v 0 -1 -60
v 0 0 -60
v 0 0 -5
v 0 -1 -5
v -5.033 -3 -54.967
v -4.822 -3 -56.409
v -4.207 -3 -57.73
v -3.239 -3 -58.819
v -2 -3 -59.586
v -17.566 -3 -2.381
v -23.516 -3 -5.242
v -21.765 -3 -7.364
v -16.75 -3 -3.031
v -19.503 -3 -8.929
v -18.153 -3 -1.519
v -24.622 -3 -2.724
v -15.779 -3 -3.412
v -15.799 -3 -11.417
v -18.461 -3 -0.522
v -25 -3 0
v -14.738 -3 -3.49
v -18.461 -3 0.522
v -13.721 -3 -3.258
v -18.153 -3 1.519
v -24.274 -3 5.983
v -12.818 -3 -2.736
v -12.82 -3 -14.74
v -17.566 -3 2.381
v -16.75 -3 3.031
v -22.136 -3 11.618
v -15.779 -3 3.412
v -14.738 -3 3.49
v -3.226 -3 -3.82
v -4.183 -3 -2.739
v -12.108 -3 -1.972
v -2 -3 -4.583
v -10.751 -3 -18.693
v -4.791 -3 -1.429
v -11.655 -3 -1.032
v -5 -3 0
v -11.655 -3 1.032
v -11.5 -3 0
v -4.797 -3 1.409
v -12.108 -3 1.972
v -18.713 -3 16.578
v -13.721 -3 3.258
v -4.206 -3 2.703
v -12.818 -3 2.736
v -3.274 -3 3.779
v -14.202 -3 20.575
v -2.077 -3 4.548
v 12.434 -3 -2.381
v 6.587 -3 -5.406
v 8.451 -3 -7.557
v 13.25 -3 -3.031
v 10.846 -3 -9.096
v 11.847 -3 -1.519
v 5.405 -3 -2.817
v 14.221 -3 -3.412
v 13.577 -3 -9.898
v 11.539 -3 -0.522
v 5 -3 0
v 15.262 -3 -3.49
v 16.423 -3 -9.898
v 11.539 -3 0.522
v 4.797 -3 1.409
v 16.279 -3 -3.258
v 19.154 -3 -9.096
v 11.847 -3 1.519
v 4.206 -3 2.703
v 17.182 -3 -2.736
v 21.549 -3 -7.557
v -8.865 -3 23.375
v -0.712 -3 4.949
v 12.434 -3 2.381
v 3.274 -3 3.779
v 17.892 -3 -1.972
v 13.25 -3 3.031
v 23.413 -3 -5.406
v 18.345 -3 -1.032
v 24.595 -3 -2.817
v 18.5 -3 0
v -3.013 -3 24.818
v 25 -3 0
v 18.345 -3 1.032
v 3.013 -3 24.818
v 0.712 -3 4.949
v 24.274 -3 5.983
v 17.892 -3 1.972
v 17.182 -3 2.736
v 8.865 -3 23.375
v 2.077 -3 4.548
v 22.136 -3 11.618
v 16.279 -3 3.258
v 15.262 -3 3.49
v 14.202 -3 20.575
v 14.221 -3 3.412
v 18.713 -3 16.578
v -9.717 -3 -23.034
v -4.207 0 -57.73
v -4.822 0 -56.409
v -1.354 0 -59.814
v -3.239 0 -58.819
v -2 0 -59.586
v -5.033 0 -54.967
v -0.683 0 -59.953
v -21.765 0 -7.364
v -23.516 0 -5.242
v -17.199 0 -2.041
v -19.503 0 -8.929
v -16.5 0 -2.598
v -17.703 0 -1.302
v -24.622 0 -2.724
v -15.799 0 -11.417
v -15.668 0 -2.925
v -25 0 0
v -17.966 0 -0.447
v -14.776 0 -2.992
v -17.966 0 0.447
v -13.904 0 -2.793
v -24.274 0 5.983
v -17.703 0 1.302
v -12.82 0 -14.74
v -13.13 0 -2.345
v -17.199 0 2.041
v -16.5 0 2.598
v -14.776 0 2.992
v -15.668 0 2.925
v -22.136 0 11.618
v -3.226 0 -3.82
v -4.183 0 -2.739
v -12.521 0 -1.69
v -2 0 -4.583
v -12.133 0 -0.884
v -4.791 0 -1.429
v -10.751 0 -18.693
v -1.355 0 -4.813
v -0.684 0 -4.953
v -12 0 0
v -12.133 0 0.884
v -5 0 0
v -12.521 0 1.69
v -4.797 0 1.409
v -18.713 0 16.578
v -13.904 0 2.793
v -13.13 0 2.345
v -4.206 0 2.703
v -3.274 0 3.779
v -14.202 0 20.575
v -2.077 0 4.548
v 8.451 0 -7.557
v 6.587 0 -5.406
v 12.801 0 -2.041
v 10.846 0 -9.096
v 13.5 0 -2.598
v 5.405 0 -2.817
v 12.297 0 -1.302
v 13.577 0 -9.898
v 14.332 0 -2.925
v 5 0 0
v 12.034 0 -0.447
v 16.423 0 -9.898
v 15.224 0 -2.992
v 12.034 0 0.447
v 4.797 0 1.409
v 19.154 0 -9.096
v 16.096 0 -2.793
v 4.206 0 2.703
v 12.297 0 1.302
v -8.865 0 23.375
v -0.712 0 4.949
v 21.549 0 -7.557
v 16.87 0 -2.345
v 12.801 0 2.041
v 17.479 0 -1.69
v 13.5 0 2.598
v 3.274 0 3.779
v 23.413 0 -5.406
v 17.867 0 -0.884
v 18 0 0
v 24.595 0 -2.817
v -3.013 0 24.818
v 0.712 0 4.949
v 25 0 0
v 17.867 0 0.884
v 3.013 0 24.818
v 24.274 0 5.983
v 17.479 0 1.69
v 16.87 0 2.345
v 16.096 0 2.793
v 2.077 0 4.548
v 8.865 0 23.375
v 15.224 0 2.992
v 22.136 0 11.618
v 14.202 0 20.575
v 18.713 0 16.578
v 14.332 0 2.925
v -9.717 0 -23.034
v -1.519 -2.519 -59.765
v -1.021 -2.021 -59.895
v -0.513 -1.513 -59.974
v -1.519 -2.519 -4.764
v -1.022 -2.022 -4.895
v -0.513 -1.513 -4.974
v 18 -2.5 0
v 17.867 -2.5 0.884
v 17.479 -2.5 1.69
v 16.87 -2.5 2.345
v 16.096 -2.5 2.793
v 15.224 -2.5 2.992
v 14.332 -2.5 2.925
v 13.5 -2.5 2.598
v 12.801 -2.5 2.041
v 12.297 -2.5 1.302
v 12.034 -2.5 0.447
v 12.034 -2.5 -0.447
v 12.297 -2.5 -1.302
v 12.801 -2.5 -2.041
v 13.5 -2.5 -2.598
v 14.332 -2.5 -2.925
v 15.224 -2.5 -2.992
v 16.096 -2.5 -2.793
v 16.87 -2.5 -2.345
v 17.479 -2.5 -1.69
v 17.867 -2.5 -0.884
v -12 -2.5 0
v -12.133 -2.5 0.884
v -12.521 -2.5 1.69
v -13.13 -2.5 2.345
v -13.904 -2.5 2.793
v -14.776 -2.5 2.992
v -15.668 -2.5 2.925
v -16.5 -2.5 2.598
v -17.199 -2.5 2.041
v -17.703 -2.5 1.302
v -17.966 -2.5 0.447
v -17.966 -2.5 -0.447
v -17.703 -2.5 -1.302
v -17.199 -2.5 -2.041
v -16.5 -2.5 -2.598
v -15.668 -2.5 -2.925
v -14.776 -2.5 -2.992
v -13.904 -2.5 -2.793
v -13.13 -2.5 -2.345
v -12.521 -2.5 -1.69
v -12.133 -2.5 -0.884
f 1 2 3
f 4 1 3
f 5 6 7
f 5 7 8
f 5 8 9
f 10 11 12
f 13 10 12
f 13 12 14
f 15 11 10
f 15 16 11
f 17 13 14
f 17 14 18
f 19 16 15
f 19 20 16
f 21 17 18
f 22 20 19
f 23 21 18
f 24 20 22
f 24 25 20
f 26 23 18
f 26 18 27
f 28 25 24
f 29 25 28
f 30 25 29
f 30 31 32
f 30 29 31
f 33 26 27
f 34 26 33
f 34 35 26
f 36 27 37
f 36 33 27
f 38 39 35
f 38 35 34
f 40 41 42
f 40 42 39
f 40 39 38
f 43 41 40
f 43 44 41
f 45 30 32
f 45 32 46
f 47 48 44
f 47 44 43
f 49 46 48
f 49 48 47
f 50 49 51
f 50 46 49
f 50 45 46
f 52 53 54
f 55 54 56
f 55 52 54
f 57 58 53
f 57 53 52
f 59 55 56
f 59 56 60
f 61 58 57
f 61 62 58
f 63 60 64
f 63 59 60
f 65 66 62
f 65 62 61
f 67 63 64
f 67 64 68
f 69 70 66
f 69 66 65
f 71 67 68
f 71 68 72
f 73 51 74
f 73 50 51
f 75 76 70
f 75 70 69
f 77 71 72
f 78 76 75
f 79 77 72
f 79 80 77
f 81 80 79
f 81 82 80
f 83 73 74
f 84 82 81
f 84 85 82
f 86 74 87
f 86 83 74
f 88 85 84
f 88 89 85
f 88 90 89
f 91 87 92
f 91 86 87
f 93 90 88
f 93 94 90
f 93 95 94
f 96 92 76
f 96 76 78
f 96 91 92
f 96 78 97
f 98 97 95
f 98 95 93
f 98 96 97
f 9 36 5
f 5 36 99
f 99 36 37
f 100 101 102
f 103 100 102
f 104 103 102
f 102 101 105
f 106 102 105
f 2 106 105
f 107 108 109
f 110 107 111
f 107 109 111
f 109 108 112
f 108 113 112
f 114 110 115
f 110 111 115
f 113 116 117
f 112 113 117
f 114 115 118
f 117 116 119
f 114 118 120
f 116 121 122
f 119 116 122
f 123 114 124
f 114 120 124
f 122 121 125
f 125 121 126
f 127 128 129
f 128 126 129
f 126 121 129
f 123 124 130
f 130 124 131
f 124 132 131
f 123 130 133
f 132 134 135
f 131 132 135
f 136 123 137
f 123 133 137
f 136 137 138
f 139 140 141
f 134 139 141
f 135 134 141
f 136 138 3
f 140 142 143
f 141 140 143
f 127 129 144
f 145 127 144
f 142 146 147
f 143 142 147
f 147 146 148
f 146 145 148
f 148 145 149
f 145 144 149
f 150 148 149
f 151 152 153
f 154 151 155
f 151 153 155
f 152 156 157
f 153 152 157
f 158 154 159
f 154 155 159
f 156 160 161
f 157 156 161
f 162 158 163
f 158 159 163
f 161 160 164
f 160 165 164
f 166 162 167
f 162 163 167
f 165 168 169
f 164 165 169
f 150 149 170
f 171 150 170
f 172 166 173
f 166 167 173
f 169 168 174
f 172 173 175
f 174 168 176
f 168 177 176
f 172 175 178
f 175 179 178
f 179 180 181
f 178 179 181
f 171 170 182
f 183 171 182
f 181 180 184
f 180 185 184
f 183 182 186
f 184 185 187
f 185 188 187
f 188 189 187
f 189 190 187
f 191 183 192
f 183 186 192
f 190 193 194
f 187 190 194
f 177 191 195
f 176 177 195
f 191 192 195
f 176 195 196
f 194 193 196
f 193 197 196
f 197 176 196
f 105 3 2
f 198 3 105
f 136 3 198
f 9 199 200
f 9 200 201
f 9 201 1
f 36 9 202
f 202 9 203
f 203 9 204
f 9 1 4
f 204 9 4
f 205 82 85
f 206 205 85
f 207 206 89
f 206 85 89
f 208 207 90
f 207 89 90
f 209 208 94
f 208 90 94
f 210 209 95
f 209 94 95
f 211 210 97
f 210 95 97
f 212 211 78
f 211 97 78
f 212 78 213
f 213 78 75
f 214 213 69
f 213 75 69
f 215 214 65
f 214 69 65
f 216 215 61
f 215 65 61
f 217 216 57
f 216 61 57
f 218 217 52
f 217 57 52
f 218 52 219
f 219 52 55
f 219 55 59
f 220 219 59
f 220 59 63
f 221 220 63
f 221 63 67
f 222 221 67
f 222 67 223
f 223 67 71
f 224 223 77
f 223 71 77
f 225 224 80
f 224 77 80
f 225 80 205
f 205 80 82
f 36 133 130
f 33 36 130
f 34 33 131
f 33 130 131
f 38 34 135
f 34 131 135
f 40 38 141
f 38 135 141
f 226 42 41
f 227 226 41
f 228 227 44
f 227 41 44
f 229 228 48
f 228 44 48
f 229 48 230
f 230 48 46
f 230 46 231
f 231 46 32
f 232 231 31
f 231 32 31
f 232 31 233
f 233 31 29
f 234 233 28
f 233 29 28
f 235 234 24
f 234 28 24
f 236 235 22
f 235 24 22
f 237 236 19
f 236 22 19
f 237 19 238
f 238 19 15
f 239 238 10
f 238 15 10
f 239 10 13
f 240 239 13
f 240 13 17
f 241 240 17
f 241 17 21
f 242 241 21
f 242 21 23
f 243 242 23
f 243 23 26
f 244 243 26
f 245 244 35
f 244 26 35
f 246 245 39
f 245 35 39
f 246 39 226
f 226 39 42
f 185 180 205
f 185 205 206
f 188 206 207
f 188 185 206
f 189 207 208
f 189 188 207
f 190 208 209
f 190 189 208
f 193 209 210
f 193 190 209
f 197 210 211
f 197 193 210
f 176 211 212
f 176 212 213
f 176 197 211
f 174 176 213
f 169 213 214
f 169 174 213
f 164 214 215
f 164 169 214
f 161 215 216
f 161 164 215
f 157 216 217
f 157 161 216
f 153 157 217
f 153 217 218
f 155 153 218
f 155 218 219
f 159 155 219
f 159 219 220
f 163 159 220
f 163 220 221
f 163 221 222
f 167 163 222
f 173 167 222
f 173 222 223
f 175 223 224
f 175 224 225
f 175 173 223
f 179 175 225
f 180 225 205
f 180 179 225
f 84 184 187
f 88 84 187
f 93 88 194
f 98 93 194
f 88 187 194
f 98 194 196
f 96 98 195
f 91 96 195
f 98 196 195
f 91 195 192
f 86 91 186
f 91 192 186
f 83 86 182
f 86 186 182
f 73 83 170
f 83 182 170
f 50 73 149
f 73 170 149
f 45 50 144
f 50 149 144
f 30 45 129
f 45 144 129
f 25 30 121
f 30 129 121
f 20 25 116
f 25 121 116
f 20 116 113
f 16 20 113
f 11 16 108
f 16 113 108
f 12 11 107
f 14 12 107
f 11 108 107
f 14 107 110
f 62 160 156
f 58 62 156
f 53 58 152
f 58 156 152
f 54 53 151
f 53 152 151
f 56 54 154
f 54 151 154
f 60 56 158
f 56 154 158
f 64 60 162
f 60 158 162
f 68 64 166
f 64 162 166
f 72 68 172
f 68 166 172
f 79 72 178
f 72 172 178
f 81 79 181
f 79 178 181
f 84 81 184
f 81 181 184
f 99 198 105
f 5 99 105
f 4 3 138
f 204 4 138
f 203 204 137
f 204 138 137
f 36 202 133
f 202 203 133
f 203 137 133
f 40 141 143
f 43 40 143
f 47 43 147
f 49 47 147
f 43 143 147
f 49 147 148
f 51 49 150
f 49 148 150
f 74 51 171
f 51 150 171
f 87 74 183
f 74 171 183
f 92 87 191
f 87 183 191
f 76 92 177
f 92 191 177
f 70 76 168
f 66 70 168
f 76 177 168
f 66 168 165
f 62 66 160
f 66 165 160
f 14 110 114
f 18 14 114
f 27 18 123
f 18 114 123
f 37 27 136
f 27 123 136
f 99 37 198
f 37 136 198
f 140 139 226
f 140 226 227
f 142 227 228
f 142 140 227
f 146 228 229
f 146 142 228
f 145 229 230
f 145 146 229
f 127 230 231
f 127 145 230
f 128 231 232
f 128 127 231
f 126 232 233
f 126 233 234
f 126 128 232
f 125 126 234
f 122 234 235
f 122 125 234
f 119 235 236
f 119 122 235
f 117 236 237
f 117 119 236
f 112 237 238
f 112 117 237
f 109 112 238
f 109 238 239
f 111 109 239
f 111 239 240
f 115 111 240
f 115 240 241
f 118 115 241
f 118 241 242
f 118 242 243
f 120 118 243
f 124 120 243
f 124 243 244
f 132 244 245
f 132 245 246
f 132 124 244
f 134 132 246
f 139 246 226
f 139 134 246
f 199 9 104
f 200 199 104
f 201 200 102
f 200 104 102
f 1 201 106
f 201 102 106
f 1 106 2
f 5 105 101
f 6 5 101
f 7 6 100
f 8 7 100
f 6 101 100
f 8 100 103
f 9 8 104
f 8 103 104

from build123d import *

# Parameters (mm, degrees)
F0_R     = 3.5
F0_R_2   = 3
F1_DEPTH = 3
F2_SIZE  = 0.5
F3_SIZE  = 2


with BuildPart() as f1:
    # F0 (on Front) → F1 (new body)
    with BuildSketch(Plane.XZ):
        with BuildLine():
            ThreePointArc((5, 0), (15, -10), (25, 0))
            ThreePointArc((25, 0), (0, 25), (-25, 0))
            ThreePointArc((-25, 0), (-23.515691, -5.242423), (-19.5034, -8.928571))
            ThreePointArc((-19.5034, -8.928571), (-9.757577, -8.515691), (-5, 0))
            ThreePointArc((-5, 0), (0, 5), (5, 0))
        make_face()
        with Locations((-15, 0)):
            Circle(F0_R, mode=Mode.SUBTRACT)
        with Locations((15, 0)):
            Circle(F0_R, mode=Mode.SUBTRACT)
        with BuildLine():
            ThreePointArc((-5, 0), (-9.757577, -8.515691), (-19.5034, -8.928571))
            ThreePointArc((-19.5034, -8.928571), (-12.820251, -14.739516), (-9.717181, -23.034244))
            Line((-9.717181, -23.034244), (-5.032841, -54.967159))
            ThreePointArc((-5.032841, -54.967159), (-4.20685, -57.729749), (-2, -59.585545))
            Line((-2, -59.585545), (-2, -4.582576))
            ThreePointArc((-2, -4.582576), (-4.1833, -2.738613), (-5, 0))
        make_face()
        with BuildLine():
            ThreePointArc((0, -5), (-1.021548, -4.894532), (-2, -4.582576))
            Line((-2, -4.582576), (-2, -59.585545))
            ThreePointArc((-2, -59.585545), (-1.021246, -59.895297), (0, -60))
            Line((0, -60), (0, -5))
        make_face()
        with Locations((-15, 0)):
            Circle(F0_R)
        with Locations((-15, 0)):
            Circle(F0_R_2, mode=Mode.SUBTRACT)
        with Locations((15, 0)):
            Circle(F0_R)
        with Locations((15, 0)):
            Circle(F0_R_2, mode=Mode.SUBTRACT)
    extrude(amount=F1_DEPTH)

    # F2
    f2_edges = [f1.edges().sort_by_distance(p)[0] for p in [
        (-18, -3, 0),
        (12, -3, 0),
    ]]
    chamfer(f2_edges, length=F2_SIZE)

    # F3
    f3_edges = [f1.edges().sort_by_distance(p)[0] for p in [
        (0, -3, -32.5),
    ]]
    chamfer(f3_edges, length=F3_SIZE)


solid = f1.part
